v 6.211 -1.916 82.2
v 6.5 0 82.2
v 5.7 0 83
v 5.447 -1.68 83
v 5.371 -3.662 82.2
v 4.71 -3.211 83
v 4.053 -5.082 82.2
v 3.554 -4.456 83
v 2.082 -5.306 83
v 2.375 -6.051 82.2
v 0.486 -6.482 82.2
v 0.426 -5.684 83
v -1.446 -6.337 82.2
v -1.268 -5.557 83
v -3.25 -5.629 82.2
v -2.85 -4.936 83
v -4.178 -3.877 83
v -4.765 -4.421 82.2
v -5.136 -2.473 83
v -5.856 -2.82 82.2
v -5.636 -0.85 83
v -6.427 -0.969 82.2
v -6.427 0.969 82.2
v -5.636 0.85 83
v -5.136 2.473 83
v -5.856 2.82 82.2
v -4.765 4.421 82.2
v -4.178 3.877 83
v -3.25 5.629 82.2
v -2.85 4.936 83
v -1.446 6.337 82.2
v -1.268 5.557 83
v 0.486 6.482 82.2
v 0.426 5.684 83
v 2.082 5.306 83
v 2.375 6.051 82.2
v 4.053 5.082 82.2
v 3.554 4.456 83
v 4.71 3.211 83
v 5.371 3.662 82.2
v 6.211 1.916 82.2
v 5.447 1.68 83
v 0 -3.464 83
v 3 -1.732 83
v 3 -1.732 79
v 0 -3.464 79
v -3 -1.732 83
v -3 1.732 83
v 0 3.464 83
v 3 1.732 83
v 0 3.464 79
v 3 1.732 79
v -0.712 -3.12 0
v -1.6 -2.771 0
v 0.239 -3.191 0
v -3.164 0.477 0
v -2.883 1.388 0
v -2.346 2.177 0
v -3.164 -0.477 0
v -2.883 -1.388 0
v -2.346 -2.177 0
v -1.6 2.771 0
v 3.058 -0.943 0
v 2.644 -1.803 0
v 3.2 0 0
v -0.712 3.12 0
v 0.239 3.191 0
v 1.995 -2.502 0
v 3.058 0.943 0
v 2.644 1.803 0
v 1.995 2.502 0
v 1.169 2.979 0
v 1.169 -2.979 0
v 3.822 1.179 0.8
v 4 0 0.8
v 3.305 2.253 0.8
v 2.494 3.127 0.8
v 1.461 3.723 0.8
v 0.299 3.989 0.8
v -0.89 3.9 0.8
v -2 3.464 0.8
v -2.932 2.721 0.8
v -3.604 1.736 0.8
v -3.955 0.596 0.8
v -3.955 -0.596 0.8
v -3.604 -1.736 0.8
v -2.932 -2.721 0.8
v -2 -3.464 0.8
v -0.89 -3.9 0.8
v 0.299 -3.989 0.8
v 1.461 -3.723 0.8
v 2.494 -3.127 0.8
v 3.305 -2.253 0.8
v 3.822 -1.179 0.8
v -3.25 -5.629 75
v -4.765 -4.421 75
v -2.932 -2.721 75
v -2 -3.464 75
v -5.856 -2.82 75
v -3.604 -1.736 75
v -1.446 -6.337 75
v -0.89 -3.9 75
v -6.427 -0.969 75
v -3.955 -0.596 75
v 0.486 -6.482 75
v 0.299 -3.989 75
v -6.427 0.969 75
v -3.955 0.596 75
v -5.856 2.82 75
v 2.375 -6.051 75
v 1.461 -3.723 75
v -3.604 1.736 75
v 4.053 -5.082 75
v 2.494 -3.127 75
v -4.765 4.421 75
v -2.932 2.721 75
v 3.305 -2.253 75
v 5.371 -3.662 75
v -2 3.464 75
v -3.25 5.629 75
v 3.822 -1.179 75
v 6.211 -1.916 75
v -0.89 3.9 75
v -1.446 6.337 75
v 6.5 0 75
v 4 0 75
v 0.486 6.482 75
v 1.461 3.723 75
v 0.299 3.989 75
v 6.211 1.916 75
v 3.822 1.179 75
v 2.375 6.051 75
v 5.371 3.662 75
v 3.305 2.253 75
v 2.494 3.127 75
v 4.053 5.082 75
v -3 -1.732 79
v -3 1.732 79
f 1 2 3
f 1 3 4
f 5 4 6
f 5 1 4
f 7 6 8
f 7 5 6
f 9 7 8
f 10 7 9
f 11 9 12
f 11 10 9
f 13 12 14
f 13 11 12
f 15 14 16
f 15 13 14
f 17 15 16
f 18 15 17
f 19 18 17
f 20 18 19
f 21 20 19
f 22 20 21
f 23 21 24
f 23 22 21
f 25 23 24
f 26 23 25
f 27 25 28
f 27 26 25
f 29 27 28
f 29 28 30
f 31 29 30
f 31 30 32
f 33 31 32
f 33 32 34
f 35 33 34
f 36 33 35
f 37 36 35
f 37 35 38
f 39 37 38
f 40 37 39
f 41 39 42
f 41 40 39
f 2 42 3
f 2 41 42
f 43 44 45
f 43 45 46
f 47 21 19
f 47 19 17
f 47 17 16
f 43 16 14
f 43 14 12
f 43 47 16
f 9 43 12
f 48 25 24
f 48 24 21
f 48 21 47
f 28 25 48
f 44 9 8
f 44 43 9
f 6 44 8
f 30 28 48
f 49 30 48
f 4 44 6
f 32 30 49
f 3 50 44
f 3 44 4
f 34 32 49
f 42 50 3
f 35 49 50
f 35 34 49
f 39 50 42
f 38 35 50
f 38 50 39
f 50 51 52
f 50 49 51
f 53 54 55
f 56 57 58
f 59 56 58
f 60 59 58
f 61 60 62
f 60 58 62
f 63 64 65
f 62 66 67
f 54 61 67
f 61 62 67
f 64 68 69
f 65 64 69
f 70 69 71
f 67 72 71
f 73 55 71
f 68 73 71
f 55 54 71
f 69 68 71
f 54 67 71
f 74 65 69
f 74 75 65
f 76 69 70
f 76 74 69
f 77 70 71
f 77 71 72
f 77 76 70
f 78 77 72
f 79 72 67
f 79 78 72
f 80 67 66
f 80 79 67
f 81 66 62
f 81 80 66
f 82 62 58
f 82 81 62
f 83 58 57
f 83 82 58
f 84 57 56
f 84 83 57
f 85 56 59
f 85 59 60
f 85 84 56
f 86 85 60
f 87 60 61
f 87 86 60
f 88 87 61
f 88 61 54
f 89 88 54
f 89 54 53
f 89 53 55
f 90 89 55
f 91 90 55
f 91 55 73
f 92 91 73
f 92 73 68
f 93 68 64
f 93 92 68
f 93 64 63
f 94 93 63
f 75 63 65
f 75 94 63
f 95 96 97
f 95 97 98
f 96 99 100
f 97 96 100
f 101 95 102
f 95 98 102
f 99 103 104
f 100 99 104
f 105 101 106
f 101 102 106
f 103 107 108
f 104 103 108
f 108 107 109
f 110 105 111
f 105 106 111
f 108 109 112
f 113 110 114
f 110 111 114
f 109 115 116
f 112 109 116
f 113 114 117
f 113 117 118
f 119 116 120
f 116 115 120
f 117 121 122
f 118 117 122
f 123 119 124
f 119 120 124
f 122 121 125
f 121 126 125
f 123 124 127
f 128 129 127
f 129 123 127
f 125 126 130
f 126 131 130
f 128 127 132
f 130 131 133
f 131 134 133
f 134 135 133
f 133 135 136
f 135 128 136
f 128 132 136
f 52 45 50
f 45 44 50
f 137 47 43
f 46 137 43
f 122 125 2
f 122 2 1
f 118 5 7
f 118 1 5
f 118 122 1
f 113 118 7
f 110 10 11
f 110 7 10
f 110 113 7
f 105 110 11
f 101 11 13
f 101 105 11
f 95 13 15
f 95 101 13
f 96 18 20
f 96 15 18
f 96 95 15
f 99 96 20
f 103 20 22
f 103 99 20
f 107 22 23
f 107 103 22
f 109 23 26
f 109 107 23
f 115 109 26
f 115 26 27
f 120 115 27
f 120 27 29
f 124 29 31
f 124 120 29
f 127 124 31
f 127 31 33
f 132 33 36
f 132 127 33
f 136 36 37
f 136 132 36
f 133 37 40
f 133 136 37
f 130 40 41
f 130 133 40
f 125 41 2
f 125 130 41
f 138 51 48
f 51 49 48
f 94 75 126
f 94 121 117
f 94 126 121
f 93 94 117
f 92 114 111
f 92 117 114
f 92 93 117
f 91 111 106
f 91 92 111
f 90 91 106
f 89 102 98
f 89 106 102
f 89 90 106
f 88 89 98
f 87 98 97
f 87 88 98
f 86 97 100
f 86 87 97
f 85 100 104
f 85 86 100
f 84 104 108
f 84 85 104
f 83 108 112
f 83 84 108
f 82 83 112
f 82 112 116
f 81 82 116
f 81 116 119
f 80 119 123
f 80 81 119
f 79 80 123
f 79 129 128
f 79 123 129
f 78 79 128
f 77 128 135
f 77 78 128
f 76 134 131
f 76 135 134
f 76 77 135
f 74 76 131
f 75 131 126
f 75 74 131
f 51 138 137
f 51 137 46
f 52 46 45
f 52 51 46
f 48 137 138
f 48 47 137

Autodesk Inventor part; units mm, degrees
ref_plane "YZ Plane" through (0, 0, 0) normal (1, 0, 0) x (0, 1, 0)
ref_plane "XZ Plane" through (0, 0, 0) normal (0, 1, 0) x (-1, 0, 0)
ref_plane "XY Plane" through (0, 0, 0) normal (0, 0, 1) x (1, 0, 0)
sketch "Sketch1" plane through (0, 0, 0) normal (0, 0, 1) x (1, 0, 0)
  circle A0 centre (0, 0) radius 4
  dimension "Diameter" = 8
extrude "Extrusion1" add sketch "Sketch1" along normal blind 75
sketch "Sketch2" plane through (0, 0, 75) normal (0, 0, 1) x (1, 0, 0)
  circle A0 centre (0, 0) radius 4 projected
  circle A1 centre (0, 0) radius 6.5
  dimension "Head_Diameter" = 13
extrude "Extrusion2" add sketch "Sketch2" along normal blind 8 contours A0 | A1
sketch "Sketch3" plane through (0, 0, 83) normal (0, 0, 1) x (1, 0, 0)
  circle A0 centre (0, 0) radius 6.5 projected
  circle A1 centre (0, 0) radius 3.4641 construction
  line L0 (0, 3.4641) -> (3, 1.7321)
  line L1 (3, -1.7321) -> (3, 1.7321)
  line L2 (0, 3.4641) -> (-3, 1.7321)
  line L3 (-3, -1.7321) -> (-3, 1.7321)
  line L4 (-3, -1.7321) -> (0, -3.4641)
  line L5 (3, -1.7321) -> (0, -3.4641)
  dimension "Hex_Width" = 6
extrude "Extrusion3" cut sketch "Sketch3" against normal blind 4 contours L0 L1 L5 L4 L3 L2
thread "Thread1" size "M8x1.25" class "4g6g" standard "ANSI Metric M Profile" length 28
chamfer "Chamfer1" distance 0.8 angle 45 2 edges at (-6.5, 0, 83) (-4, 0, 0)
equation "\"d9\" = ThreadLength"
equation "\"d12\" = Chamfer"
equation "\"ThreadLength\" = 28"
equation "\"Chamfer\" = 0.8"
properties part number "SCREW, SOCKET HD, P, 12_9, M8X1_25X75MM" material "Steel, MS"
